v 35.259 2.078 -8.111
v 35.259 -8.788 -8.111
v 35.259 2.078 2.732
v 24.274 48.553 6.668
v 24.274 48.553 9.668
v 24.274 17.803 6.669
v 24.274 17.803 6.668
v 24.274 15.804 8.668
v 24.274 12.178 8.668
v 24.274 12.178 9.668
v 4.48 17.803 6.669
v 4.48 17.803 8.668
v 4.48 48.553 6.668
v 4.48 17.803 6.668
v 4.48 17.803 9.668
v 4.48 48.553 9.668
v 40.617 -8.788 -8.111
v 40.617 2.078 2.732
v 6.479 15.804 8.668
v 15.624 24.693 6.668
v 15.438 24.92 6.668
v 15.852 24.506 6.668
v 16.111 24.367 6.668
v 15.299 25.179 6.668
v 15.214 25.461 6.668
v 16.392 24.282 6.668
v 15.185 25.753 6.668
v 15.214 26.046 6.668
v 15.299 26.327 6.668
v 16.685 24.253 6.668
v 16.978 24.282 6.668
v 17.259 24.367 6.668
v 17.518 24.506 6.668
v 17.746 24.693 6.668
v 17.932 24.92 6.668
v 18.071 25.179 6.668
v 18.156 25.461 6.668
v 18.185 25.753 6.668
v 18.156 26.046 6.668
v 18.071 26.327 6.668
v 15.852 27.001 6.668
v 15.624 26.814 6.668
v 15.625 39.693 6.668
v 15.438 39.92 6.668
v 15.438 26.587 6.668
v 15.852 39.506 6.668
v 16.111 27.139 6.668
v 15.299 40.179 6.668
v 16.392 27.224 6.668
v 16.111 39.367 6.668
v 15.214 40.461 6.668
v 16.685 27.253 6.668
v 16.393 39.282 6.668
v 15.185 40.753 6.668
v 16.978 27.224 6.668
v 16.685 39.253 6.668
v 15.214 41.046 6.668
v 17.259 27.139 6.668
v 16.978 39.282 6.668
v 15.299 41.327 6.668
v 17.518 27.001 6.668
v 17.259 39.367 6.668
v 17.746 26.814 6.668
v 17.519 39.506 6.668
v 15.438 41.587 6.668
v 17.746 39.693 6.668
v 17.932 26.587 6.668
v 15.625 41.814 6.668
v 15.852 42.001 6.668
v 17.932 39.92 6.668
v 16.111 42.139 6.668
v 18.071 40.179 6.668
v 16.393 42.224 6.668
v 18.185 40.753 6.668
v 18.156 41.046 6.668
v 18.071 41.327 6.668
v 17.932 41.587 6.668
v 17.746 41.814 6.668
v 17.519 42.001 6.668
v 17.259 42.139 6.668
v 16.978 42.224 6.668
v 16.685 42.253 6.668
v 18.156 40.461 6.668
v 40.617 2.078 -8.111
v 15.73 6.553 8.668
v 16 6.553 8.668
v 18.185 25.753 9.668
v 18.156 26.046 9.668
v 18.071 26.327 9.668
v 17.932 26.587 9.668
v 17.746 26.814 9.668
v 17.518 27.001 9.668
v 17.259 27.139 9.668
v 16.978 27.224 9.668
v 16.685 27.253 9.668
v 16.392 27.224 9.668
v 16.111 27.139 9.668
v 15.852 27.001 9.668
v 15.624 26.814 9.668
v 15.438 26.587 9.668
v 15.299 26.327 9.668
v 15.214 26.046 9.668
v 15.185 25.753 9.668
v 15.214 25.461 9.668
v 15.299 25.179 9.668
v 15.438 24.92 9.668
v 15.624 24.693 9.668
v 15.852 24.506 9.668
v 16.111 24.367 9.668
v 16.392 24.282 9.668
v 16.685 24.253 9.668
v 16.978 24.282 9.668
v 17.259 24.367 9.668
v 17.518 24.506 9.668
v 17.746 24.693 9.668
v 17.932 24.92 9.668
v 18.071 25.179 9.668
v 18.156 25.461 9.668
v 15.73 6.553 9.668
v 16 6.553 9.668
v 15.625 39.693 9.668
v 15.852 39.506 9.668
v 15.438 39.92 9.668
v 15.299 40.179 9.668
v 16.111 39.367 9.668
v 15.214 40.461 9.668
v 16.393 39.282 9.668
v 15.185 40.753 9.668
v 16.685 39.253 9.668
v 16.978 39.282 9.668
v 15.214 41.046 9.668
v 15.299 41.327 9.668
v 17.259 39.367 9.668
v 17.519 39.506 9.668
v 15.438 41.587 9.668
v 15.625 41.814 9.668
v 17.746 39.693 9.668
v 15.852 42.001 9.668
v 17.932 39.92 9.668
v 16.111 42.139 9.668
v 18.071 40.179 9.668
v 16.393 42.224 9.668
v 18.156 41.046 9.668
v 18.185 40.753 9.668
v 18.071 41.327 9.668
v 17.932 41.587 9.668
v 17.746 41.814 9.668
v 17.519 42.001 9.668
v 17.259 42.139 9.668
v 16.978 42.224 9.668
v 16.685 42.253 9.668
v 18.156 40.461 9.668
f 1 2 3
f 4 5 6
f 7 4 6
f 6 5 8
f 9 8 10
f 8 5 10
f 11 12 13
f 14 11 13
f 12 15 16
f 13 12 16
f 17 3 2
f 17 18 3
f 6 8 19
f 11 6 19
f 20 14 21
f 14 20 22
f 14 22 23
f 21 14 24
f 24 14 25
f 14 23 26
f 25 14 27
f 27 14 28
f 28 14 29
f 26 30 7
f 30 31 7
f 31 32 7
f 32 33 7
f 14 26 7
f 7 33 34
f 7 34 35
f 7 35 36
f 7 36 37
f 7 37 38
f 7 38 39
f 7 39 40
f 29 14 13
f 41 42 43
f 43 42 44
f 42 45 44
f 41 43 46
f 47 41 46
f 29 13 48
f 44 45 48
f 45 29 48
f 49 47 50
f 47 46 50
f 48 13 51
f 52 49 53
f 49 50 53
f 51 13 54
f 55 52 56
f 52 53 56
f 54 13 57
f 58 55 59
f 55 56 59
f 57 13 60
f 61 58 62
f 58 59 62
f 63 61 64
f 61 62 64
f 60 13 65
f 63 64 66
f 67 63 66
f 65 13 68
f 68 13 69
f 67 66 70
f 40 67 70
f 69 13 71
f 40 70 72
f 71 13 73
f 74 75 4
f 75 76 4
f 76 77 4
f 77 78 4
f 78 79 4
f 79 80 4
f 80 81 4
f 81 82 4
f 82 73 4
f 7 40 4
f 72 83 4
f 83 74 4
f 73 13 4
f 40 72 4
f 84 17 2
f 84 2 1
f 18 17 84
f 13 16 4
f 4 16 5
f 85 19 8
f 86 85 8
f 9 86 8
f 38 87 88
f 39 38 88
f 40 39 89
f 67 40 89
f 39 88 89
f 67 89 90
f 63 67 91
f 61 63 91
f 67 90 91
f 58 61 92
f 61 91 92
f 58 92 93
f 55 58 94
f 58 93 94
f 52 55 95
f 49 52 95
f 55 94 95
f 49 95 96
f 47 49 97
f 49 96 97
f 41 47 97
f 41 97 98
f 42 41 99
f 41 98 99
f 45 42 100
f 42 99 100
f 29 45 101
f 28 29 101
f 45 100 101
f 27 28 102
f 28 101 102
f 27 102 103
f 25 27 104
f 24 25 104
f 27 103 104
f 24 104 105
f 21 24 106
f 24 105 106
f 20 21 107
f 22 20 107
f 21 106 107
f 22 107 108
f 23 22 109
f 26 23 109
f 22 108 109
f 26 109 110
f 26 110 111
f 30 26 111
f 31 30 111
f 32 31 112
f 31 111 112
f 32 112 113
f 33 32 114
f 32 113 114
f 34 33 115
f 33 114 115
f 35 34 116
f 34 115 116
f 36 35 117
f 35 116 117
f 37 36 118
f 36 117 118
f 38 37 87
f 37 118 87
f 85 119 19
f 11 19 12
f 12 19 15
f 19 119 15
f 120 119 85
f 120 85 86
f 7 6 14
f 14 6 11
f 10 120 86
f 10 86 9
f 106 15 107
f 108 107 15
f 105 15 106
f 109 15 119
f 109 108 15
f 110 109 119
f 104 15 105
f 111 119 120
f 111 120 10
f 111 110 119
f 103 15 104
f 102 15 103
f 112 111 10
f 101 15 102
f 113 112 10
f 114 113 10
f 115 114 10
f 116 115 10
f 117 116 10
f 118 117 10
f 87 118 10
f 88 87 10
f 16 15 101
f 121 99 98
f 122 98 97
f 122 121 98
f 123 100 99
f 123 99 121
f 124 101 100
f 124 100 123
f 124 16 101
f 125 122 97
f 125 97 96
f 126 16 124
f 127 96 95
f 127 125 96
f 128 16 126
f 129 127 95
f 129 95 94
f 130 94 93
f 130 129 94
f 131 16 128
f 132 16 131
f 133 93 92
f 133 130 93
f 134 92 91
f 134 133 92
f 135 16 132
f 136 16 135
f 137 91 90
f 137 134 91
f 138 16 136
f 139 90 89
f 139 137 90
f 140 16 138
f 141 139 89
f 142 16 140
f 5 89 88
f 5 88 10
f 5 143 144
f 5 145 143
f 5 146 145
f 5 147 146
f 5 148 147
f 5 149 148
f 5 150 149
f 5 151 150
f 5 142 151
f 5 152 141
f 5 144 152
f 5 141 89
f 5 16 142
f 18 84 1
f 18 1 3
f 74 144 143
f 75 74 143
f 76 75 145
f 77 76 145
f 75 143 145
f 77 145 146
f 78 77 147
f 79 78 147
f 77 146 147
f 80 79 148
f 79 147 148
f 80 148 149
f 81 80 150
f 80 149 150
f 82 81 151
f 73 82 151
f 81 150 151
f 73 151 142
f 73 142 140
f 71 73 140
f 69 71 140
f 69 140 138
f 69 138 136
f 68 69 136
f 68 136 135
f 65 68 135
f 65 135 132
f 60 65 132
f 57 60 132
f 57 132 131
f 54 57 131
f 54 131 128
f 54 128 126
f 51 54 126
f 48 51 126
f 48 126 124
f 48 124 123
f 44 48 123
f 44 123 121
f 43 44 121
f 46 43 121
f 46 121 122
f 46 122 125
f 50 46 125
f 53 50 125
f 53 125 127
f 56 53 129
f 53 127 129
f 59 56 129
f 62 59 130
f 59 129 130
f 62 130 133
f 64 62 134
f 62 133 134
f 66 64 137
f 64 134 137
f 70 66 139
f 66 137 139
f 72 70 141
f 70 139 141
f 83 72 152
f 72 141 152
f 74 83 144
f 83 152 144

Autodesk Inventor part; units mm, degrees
ref_plane "YZ Plane" through (0, 0, 0) normal (1, 0, 0) x (0, 1, 0)
ref_plane "XZ Plane" through (0, 0, 0) normal (0, 1, 0) x (-1, 0, 0)
ref_plane "XY Plane" through (0, 0, 0) normal (0, 0, 1) x (1, 0, 0)
sketch "Эскиз1" plane through (40.6168, 2.0533, -8.0979) normal (1, 0, 0) x (0, 1, 0)
  line L0 (0.0252, 10.8303) -> (-10.8412, -0.0136)
  line L1 (-10.8412, -0.0136) -> (0.0252, -0.0136)
  line L2 (0.0252, -0.0136) -> (0.0252, 10.8303)
  point P0 (-2.0533, 8.0979)
extrude "Выдавливание1" add sketch "Эскиз1" against normal blind 5.358
sketch "Эскиз2" plane through (4.4799, 48.5533, 9.6685) normal (0, 0, 1) x (1, 0, 0)
  line L0 (11.25, -42) -> (0, -30.75) projected
  line L1 (0, -30.75) -> (0, 0) projected
  line L2 (0, 0) -> (-7.4799, 0) projected
  line L3 (11.5201, -60) -> (11.5201, -42) projected
  line L4 (11.25, -42) -> (11.5201, -42) projected
  line L5 (0, 0) -> (19.7943, 0)
  line L6 (19.7943, 0) -> (19.7943, -36.375)
  line L7 (19.7943, -36.375) -> (5.625, -36.375)
  circle A0 centre (-3.7947, -7.8002) radius 1.5003 projected
  circle A1 centre (-3.7949, -22.8) radius 1.5 projected
  circle A2 centre (12.2053, -7.8) radius 1.5
  circle A3 centre (12.2051, -22.8) radius 1.5
  line L8 (11.5201, -42) -> (19.7943, -36.375)
  line L9 (-0.1192, -30.8692) -> (0, -30.75)
  line L10 (19.7943, -30.75) -> (0, -30.75)
  line L11 (19.7943, -30.75) -> (11.5201, -42)
  point P0 (-4.4799, -48.5533)
  point P1 (15.6572, -36.375)
  dimension "d2" = 3
  dimension "d3" = 3
  dimension "d4" = 16
  dimension "d5" = 16
  dimension "d6" = 13.575
  dimension "d7" = 13.575
  dimension "d8" = 15
extrude "Выдавливание2" add sketch "Эскиз2" against normal blind 3 contours L1 L5 L6 L10
extrude "Выдавливание3" add sketch "Эскиз2" against normal blind 1 contours L0 L7 L11 L4 | L0 L10 L11 L7 | L11 L7 L8 | L11 L6 L7
chamfer "Фаска1" distance 2 angle 45 1 edges at (14.377, 17.8033, 8.6685)
properties part number "крепежная основа_спасена"
